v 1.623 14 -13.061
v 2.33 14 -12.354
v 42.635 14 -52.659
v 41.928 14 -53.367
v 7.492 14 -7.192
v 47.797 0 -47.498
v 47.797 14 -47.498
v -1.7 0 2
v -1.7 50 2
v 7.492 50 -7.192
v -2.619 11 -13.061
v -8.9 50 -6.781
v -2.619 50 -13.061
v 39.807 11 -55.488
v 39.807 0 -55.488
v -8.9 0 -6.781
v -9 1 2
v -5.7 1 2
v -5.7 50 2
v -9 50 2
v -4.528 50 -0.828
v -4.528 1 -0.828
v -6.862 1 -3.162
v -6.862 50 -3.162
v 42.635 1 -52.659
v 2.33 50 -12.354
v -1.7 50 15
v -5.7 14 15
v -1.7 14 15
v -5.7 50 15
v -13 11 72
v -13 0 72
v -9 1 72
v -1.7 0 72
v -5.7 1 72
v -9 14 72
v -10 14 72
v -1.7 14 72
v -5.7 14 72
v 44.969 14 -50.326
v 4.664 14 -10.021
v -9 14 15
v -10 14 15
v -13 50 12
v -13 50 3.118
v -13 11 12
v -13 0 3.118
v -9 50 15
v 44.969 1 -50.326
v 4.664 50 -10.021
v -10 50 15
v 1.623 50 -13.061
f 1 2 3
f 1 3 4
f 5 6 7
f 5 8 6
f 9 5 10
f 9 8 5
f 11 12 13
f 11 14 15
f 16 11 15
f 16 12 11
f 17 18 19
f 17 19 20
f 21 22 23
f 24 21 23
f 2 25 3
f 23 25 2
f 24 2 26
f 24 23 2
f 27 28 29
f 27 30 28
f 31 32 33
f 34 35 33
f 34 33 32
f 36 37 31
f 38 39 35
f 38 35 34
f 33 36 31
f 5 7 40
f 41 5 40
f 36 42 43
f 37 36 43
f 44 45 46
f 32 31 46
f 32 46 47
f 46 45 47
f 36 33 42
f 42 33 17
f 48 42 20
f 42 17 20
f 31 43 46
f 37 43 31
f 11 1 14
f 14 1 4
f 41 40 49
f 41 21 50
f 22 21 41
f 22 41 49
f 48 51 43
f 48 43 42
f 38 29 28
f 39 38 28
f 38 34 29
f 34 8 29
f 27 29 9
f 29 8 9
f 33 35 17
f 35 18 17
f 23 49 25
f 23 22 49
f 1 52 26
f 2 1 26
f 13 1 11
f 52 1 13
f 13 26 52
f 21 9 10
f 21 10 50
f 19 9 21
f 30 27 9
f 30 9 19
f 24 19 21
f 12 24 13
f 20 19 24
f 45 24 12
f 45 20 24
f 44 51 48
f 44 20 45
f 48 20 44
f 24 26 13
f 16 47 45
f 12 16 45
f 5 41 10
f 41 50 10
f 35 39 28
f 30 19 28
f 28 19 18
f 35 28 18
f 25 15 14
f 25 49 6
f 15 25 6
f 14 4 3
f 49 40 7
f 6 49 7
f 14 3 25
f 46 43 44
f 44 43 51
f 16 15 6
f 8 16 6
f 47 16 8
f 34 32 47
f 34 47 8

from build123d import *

# Parameters (mm, degrees)
BOSS_EXTRUDE1_DEPTH = 50
SKETCH3_W           = 3.3
SKETCH3_H           = 1
BOSS_EXTRUDE2_DEPTH = 13
BOSS_EXTRUDE3_DEPTH = 57
CHAMFER1_START      = -14
CHAMFER1_OUTLINE_W  = 52
CHAMFER1_OUTLINE_H  = 13
CHAMFER1_DEPTH      = 3.182909169
CHAMFER2_SIZE       = 3


with BuildPart() as part:
    # Sketch2 → Boss-Extrude1 (new body)
    with BuildSketch(Plane(origin=(0, 0, 0), x_dir=(1, 0, 0), z_dir=(0, 1, 0))):
        Polygon((-1.7, -2), (-1.7, -15), (-5.7, -15), (-5.7, -2), (-9, -2), (-9, -15), (-13, -15), (-13, 2.680601608), align=None)
    extrude(amount=BOSS_EXTRUDE1_DEPTH)

    # Sketch3 → Boss-Extrude2 (add)
    with BuildSketch(Plane.XY.offset(2)):
        with Locations((-7.35, 0.5)):
            Rectangle(SKETCH3_W, SKETCH3_H)
    extrude(amount=BOSS_EXTRUDE2_DEPTH)

    # Sketch5 → Boss-Extrude3 (add)
    with BuildSketch(Plane.XY.offset(15)):
        Polygon((-13, 0), (-1.7, 0), (-1.7, 14), (-5.7, 14), (-5.7, 1), (-9, 1), (-9, 14), (-13, 14), align=None)
    extrude(amount=BOSS_EXTRUDE3_DEPTH)

    # Mirror1: part across plane


with BuildPart() as part_1:
    add(part.part)
    add(part.part.mirror(Plane(origin=(-0.956063716, 0, 2.308147732), x_dir=(0.9238798691632129, 0, 0.38268261961443256), z_dir=(0.3826826196144326, 0, -0.9238798691632131))))

    # Chamfer1: read off the stored shape, not the designer's step
    # Chamfer1 outline → Chamfer1 (cut)
    with BuildSketch(Plane(origin=(0, 0, 0), x_dir=(0, 1, 0), z_dir=(0.9238798691632129, 0, 0.38268261961443295)).offset(CHAMFER1_START)):
        with Locations((25, 2.5)):
            Rectangle(CHAMFER1_OUTLINE_W, CHAMFER1_OUTLINE_H)
    extrude(amount=CHAMFER1_DEPTH, mode=Mode.SUBTRACT)

    # Chamfer2
    chamfer2_edges = [part_1.edges().sort_by_distance(p)[0] for p in [
        (-13, 32, 15),
        (-13, 14, 43.5),
        (-0.497948704, 32, -15.182696898),
        (19.654559103, 14, -35.335275619),
    ]]
    chamfer(chamfer2_edges, length=CHAMFER2_SIZE)


solid = part_1.part
